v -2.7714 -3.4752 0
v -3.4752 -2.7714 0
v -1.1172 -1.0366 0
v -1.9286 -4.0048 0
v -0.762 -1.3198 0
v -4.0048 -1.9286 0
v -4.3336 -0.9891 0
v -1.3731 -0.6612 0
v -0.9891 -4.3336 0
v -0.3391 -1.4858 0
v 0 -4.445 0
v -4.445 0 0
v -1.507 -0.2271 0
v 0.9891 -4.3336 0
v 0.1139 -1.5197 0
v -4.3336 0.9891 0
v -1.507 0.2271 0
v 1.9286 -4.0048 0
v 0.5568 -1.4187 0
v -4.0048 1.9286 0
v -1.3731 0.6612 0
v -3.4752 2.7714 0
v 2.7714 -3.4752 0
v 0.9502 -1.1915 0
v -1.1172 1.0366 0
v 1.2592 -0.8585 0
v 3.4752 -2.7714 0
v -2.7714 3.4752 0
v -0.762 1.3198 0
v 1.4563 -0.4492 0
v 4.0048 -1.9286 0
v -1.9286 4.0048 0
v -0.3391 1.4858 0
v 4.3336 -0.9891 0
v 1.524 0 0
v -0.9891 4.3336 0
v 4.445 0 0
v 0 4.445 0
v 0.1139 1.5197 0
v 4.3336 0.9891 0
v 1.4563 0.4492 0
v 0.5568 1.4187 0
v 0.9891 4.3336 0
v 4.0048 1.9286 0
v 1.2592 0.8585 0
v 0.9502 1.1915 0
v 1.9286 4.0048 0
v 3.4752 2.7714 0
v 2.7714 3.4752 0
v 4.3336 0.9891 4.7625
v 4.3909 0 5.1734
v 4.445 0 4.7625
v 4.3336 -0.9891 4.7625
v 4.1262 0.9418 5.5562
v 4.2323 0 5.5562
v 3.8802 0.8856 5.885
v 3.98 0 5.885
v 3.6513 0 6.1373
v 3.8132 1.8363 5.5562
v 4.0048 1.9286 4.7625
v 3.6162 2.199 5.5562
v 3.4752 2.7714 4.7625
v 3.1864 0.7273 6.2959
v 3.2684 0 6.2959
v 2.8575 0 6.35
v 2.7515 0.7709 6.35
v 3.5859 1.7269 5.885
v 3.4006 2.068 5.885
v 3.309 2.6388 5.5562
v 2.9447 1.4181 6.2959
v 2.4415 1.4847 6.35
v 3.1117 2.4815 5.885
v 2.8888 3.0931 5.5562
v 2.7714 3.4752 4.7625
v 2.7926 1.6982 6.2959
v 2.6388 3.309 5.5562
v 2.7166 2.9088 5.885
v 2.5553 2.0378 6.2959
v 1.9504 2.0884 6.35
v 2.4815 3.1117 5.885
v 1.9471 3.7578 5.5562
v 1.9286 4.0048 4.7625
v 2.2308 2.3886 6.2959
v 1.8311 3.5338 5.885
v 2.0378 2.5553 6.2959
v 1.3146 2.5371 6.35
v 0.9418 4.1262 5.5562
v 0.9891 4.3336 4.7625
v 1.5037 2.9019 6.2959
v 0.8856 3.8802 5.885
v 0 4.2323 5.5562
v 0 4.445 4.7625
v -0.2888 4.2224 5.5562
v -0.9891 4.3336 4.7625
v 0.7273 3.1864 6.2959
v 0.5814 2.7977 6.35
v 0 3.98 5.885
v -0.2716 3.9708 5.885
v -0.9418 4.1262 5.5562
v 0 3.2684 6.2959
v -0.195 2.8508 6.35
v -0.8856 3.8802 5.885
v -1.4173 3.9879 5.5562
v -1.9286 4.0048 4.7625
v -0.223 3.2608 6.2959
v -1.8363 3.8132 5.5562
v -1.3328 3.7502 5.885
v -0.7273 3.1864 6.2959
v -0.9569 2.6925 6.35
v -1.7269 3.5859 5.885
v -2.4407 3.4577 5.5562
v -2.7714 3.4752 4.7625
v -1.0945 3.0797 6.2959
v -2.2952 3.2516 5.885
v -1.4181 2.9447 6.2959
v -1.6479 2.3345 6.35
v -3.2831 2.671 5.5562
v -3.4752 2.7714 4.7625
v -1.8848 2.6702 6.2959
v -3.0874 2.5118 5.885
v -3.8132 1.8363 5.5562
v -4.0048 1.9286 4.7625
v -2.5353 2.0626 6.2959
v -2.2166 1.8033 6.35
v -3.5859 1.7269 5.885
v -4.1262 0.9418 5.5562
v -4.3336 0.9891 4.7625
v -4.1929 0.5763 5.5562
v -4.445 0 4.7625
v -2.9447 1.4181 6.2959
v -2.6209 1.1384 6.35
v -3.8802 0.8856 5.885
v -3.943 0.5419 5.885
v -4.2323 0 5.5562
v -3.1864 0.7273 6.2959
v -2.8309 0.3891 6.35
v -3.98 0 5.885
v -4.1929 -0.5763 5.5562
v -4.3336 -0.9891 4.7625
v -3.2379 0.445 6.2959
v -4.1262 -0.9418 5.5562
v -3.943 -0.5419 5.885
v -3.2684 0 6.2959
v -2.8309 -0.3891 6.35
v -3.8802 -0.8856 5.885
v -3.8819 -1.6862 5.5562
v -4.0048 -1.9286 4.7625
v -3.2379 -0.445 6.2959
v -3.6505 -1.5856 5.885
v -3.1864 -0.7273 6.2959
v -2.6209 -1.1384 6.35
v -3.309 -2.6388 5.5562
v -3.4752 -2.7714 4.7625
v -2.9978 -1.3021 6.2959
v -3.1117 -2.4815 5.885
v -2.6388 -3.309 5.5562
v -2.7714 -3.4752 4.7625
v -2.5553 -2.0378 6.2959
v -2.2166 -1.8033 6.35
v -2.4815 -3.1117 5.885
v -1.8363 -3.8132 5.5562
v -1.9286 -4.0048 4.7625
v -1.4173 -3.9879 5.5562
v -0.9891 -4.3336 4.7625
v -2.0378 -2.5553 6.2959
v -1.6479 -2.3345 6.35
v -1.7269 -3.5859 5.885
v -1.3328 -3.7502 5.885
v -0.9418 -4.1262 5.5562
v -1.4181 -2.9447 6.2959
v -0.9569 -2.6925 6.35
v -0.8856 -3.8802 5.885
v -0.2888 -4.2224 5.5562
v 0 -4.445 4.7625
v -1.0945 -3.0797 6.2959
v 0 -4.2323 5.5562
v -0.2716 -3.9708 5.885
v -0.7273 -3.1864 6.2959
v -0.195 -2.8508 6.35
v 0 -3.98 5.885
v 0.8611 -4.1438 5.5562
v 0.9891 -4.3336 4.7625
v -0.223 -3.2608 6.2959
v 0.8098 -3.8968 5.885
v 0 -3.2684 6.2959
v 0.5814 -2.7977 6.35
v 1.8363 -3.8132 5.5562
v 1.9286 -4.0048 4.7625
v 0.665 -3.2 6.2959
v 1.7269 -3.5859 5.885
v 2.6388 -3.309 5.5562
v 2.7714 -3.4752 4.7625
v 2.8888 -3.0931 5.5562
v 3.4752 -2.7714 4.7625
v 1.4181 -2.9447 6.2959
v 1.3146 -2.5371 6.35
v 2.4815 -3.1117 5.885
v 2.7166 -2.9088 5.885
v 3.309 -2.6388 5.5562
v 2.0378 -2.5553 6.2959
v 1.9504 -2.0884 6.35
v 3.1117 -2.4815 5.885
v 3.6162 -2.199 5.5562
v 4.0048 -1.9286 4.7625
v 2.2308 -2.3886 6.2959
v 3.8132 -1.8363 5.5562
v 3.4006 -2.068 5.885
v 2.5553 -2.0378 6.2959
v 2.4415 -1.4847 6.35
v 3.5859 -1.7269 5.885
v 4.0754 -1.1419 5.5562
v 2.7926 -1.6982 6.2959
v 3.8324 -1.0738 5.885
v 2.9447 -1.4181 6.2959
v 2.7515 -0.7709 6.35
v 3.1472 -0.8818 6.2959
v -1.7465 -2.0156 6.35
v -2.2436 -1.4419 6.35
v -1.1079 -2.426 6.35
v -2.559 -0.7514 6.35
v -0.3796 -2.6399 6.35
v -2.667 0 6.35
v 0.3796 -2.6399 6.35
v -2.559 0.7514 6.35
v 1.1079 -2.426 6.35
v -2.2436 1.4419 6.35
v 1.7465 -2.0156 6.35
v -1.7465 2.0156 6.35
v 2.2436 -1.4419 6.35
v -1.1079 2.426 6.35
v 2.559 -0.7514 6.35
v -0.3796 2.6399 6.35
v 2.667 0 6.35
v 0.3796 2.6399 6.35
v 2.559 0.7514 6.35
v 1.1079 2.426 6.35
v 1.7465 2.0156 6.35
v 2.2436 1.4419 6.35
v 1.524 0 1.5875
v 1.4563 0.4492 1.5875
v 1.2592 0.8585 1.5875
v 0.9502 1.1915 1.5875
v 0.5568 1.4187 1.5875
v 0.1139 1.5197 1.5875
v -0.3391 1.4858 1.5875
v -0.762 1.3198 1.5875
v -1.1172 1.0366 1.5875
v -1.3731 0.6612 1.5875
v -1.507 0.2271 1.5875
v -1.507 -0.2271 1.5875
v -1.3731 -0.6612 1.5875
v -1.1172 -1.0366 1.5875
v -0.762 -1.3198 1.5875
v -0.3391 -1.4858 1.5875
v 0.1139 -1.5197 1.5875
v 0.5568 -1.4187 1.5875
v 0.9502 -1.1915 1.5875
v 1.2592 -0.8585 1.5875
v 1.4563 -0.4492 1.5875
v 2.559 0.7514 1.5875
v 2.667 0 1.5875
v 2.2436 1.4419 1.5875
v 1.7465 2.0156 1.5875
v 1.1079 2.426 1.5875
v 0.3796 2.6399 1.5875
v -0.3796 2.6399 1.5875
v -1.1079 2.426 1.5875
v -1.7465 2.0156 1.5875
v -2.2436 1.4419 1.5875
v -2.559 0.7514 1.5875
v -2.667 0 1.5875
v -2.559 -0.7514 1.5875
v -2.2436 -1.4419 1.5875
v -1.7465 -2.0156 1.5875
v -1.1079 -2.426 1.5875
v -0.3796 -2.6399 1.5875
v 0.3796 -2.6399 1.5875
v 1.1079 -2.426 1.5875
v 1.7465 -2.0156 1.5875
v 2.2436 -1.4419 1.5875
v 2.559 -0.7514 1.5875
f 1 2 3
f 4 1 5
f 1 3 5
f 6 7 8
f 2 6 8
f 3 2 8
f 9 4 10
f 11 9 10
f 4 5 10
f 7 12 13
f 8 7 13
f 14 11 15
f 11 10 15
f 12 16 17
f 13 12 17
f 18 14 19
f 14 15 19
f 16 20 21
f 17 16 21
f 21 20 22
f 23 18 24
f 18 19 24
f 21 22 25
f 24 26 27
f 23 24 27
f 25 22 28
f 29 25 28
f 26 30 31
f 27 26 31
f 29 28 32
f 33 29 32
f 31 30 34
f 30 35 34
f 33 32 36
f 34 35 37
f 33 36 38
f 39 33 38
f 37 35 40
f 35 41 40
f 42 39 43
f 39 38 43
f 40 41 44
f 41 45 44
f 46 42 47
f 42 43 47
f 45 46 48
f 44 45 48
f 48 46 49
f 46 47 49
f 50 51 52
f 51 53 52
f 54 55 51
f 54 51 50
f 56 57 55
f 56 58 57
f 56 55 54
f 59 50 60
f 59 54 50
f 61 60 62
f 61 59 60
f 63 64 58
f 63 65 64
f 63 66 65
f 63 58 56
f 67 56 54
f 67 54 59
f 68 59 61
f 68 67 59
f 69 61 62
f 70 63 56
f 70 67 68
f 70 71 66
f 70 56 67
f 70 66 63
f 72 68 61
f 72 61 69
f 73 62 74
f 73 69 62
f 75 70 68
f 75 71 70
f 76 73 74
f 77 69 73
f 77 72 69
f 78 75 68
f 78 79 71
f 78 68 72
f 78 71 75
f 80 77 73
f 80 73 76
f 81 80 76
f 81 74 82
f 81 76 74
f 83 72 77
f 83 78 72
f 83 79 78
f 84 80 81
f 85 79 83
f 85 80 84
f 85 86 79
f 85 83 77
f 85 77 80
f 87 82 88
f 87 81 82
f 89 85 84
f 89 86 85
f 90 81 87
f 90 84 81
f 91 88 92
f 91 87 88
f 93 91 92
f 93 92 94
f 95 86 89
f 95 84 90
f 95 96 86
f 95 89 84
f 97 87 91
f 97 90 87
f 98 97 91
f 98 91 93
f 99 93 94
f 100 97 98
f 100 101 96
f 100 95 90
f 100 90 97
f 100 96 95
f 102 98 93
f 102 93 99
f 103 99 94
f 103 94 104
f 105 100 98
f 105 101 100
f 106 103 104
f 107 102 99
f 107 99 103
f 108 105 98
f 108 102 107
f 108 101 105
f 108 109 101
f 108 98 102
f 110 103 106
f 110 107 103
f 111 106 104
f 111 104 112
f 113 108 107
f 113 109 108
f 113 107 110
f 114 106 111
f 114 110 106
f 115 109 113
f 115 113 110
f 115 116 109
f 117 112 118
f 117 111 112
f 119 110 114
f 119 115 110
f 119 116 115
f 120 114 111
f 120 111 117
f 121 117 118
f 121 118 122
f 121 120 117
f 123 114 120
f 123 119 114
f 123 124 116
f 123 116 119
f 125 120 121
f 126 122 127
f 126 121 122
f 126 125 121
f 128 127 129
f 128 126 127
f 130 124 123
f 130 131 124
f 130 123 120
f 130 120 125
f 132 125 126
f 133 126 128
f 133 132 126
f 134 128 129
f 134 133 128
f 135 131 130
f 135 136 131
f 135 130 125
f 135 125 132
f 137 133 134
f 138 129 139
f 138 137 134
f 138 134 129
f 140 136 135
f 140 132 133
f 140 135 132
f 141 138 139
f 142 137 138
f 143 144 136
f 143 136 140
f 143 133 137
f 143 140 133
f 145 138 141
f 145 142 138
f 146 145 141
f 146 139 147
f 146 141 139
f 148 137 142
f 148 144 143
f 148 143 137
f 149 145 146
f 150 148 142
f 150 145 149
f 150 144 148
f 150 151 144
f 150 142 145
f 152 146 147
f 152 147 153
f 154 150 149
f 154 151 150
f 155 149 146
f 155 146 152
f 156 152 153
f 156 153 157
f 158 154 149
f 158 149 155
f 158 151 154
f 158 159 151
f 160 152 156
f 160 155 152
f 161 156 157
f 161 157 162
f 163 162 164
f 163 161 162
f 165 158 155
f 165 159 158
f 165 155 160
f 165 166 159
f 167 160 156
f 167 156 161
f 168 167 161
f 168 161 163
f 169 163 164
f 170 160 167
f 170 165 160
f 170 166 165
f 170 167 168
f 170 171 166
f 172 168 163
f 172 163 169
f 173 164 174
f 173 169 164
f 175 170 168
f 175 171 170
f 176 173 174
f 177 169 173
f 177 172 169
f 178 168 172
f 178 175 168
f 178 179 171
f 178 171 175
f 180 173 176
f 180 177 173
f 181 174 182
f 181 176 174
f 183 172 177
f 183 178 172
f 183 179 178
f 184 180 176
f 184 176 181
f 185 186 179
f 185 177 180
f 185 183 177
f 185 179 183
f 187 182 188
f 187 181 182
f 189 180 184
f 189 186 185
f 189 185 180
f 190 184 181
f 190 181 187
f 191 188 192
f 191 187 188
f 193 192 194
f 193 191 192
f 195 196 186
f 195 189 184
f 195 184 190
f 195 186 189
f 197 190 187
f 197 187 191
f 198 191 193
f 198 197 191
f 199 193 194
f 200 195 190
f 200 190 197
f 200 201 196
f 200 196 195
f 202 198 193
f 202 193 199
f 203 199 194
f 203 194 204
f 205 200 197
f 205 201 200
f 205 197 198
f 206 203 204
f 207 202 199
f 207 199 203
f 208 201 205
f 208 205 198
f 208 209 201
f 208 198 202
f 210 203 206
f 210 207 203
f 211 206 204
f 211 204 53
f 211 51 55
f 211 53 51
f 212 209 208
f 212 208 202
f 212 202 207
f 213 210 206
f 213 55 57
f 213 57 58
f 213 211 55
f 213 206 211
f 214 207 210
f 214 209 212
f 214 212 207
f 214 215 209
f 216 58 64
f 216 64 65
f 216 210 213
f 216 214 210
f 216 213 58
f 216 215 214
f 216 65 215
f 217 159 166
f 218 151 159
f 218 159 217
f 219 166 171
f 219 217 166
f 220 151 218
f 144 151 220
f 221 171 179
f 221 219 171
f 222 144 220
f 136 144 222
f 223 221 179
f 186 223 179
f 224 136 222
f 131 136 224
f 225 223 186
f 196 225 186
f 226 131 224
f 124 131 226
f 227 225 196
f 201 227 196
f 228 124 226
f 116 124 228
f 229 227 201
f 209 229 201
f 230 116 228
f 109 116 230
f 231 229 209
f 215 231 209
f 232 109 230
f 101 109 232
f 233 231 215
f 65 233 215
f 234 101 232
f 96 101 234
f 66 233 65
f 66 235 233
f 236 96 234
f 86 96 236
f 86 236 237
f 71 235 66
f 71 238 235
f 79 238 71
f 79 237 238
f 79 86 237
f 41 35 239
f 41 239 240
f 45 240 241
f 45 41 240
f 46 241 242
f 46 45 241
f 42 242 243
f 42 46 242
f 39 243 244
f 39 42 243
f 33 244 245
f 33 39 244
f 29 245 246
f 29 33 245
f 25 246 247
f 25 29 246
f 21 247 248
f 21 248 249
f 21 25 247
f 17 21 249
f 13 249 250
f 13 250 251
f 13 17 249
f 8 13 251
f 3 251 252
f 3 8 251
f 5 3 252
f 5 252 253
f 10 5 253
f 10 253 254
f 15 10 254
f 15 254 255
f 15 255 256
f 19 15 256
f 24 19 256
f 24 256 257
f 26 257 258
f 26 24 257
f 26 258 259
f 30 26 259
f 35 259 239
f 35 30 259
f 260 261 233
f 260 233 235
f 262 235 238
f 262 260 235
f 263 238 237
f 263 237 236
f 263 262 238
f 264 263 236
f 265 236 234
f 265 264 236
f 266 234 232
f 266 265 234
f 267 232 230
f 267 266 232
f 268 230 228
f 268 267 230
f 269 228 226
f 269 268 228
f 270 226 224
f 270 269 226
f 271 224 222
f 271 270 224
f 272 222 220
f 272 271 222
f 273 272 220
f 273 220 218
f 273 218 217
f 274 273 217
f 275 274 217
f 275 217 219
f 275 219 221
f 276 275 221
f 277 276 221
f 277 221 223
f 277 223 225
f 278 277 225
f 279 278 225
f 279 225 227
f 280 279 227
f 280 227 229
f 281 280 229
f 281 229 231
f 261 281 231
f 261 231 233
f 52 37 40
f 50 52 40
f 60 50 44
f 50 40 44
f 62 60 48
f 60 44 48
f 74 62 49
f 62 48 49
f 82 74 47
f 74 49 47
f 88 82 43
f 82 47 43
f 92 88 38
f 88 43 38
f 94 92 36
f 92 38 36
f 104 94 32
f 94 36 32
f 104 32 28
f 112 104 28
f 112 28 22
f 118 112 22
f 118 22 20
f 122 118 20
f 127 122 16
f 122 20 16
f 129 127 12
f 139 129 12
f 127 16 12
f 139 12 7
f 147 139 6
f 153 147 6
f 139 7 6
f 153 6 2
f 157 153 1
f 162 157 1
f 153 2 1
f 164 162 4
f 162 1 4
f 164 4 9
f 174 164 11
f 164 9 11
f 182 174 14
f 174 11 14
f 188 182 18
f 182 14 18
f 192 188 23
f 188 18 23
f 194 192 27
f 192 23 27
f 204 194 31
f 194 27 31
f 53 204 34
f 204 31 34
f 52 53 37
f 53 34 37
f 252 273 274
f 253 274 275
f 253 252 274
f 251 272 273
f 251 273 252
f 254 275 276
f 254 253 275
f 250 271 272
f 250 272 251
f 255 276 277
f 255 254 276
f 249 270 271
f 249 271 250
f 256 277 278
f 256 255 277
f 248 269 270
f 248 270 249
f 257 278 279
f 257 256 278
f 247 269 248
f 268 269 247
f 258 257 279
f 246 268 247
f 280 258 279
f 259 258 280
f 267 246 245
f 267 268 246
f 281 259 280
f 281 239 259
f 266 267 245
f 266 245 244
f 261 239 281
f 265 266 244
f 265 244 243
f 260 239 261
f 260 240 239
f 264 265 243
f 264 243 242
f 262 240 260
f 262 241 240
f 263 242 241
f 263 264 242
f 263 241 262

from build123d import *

# Parameters (mm, degrees)
F0_R     = 4.445
F0_R_2   = 2.667
F1_DEPTH = 6.35
F0_R_3   = 1.524
F2_DEPTH = 1.5875
F3_R     = 1.5875


with BuildPart() as f1:
    # F0 (on Top) → F1 (new body)
    with BuildSketch(Plane.XY):
        Circle(F0_R)
        Circle(F0_R_2, mode=Mode.SUBTRACT)
    extrude(amount=F1_DEPTH)

    # F0 (on Top) → F2 (join)
    with BuildSketch(Plane.XY):
        Circle(F0_R_2)
        Circle(F0_R_3, mode=Mode.SUBTRACT)
    extrude(amount=F2_DEPTH)

    # F3
    f3_edges = [f1.edges().sort_by_distance(p)[0] for p in [
        (-4.445, 0, 6.35),
    ]]
    fillet(f3_edges, radius=F3_R)


solid = f1.part
